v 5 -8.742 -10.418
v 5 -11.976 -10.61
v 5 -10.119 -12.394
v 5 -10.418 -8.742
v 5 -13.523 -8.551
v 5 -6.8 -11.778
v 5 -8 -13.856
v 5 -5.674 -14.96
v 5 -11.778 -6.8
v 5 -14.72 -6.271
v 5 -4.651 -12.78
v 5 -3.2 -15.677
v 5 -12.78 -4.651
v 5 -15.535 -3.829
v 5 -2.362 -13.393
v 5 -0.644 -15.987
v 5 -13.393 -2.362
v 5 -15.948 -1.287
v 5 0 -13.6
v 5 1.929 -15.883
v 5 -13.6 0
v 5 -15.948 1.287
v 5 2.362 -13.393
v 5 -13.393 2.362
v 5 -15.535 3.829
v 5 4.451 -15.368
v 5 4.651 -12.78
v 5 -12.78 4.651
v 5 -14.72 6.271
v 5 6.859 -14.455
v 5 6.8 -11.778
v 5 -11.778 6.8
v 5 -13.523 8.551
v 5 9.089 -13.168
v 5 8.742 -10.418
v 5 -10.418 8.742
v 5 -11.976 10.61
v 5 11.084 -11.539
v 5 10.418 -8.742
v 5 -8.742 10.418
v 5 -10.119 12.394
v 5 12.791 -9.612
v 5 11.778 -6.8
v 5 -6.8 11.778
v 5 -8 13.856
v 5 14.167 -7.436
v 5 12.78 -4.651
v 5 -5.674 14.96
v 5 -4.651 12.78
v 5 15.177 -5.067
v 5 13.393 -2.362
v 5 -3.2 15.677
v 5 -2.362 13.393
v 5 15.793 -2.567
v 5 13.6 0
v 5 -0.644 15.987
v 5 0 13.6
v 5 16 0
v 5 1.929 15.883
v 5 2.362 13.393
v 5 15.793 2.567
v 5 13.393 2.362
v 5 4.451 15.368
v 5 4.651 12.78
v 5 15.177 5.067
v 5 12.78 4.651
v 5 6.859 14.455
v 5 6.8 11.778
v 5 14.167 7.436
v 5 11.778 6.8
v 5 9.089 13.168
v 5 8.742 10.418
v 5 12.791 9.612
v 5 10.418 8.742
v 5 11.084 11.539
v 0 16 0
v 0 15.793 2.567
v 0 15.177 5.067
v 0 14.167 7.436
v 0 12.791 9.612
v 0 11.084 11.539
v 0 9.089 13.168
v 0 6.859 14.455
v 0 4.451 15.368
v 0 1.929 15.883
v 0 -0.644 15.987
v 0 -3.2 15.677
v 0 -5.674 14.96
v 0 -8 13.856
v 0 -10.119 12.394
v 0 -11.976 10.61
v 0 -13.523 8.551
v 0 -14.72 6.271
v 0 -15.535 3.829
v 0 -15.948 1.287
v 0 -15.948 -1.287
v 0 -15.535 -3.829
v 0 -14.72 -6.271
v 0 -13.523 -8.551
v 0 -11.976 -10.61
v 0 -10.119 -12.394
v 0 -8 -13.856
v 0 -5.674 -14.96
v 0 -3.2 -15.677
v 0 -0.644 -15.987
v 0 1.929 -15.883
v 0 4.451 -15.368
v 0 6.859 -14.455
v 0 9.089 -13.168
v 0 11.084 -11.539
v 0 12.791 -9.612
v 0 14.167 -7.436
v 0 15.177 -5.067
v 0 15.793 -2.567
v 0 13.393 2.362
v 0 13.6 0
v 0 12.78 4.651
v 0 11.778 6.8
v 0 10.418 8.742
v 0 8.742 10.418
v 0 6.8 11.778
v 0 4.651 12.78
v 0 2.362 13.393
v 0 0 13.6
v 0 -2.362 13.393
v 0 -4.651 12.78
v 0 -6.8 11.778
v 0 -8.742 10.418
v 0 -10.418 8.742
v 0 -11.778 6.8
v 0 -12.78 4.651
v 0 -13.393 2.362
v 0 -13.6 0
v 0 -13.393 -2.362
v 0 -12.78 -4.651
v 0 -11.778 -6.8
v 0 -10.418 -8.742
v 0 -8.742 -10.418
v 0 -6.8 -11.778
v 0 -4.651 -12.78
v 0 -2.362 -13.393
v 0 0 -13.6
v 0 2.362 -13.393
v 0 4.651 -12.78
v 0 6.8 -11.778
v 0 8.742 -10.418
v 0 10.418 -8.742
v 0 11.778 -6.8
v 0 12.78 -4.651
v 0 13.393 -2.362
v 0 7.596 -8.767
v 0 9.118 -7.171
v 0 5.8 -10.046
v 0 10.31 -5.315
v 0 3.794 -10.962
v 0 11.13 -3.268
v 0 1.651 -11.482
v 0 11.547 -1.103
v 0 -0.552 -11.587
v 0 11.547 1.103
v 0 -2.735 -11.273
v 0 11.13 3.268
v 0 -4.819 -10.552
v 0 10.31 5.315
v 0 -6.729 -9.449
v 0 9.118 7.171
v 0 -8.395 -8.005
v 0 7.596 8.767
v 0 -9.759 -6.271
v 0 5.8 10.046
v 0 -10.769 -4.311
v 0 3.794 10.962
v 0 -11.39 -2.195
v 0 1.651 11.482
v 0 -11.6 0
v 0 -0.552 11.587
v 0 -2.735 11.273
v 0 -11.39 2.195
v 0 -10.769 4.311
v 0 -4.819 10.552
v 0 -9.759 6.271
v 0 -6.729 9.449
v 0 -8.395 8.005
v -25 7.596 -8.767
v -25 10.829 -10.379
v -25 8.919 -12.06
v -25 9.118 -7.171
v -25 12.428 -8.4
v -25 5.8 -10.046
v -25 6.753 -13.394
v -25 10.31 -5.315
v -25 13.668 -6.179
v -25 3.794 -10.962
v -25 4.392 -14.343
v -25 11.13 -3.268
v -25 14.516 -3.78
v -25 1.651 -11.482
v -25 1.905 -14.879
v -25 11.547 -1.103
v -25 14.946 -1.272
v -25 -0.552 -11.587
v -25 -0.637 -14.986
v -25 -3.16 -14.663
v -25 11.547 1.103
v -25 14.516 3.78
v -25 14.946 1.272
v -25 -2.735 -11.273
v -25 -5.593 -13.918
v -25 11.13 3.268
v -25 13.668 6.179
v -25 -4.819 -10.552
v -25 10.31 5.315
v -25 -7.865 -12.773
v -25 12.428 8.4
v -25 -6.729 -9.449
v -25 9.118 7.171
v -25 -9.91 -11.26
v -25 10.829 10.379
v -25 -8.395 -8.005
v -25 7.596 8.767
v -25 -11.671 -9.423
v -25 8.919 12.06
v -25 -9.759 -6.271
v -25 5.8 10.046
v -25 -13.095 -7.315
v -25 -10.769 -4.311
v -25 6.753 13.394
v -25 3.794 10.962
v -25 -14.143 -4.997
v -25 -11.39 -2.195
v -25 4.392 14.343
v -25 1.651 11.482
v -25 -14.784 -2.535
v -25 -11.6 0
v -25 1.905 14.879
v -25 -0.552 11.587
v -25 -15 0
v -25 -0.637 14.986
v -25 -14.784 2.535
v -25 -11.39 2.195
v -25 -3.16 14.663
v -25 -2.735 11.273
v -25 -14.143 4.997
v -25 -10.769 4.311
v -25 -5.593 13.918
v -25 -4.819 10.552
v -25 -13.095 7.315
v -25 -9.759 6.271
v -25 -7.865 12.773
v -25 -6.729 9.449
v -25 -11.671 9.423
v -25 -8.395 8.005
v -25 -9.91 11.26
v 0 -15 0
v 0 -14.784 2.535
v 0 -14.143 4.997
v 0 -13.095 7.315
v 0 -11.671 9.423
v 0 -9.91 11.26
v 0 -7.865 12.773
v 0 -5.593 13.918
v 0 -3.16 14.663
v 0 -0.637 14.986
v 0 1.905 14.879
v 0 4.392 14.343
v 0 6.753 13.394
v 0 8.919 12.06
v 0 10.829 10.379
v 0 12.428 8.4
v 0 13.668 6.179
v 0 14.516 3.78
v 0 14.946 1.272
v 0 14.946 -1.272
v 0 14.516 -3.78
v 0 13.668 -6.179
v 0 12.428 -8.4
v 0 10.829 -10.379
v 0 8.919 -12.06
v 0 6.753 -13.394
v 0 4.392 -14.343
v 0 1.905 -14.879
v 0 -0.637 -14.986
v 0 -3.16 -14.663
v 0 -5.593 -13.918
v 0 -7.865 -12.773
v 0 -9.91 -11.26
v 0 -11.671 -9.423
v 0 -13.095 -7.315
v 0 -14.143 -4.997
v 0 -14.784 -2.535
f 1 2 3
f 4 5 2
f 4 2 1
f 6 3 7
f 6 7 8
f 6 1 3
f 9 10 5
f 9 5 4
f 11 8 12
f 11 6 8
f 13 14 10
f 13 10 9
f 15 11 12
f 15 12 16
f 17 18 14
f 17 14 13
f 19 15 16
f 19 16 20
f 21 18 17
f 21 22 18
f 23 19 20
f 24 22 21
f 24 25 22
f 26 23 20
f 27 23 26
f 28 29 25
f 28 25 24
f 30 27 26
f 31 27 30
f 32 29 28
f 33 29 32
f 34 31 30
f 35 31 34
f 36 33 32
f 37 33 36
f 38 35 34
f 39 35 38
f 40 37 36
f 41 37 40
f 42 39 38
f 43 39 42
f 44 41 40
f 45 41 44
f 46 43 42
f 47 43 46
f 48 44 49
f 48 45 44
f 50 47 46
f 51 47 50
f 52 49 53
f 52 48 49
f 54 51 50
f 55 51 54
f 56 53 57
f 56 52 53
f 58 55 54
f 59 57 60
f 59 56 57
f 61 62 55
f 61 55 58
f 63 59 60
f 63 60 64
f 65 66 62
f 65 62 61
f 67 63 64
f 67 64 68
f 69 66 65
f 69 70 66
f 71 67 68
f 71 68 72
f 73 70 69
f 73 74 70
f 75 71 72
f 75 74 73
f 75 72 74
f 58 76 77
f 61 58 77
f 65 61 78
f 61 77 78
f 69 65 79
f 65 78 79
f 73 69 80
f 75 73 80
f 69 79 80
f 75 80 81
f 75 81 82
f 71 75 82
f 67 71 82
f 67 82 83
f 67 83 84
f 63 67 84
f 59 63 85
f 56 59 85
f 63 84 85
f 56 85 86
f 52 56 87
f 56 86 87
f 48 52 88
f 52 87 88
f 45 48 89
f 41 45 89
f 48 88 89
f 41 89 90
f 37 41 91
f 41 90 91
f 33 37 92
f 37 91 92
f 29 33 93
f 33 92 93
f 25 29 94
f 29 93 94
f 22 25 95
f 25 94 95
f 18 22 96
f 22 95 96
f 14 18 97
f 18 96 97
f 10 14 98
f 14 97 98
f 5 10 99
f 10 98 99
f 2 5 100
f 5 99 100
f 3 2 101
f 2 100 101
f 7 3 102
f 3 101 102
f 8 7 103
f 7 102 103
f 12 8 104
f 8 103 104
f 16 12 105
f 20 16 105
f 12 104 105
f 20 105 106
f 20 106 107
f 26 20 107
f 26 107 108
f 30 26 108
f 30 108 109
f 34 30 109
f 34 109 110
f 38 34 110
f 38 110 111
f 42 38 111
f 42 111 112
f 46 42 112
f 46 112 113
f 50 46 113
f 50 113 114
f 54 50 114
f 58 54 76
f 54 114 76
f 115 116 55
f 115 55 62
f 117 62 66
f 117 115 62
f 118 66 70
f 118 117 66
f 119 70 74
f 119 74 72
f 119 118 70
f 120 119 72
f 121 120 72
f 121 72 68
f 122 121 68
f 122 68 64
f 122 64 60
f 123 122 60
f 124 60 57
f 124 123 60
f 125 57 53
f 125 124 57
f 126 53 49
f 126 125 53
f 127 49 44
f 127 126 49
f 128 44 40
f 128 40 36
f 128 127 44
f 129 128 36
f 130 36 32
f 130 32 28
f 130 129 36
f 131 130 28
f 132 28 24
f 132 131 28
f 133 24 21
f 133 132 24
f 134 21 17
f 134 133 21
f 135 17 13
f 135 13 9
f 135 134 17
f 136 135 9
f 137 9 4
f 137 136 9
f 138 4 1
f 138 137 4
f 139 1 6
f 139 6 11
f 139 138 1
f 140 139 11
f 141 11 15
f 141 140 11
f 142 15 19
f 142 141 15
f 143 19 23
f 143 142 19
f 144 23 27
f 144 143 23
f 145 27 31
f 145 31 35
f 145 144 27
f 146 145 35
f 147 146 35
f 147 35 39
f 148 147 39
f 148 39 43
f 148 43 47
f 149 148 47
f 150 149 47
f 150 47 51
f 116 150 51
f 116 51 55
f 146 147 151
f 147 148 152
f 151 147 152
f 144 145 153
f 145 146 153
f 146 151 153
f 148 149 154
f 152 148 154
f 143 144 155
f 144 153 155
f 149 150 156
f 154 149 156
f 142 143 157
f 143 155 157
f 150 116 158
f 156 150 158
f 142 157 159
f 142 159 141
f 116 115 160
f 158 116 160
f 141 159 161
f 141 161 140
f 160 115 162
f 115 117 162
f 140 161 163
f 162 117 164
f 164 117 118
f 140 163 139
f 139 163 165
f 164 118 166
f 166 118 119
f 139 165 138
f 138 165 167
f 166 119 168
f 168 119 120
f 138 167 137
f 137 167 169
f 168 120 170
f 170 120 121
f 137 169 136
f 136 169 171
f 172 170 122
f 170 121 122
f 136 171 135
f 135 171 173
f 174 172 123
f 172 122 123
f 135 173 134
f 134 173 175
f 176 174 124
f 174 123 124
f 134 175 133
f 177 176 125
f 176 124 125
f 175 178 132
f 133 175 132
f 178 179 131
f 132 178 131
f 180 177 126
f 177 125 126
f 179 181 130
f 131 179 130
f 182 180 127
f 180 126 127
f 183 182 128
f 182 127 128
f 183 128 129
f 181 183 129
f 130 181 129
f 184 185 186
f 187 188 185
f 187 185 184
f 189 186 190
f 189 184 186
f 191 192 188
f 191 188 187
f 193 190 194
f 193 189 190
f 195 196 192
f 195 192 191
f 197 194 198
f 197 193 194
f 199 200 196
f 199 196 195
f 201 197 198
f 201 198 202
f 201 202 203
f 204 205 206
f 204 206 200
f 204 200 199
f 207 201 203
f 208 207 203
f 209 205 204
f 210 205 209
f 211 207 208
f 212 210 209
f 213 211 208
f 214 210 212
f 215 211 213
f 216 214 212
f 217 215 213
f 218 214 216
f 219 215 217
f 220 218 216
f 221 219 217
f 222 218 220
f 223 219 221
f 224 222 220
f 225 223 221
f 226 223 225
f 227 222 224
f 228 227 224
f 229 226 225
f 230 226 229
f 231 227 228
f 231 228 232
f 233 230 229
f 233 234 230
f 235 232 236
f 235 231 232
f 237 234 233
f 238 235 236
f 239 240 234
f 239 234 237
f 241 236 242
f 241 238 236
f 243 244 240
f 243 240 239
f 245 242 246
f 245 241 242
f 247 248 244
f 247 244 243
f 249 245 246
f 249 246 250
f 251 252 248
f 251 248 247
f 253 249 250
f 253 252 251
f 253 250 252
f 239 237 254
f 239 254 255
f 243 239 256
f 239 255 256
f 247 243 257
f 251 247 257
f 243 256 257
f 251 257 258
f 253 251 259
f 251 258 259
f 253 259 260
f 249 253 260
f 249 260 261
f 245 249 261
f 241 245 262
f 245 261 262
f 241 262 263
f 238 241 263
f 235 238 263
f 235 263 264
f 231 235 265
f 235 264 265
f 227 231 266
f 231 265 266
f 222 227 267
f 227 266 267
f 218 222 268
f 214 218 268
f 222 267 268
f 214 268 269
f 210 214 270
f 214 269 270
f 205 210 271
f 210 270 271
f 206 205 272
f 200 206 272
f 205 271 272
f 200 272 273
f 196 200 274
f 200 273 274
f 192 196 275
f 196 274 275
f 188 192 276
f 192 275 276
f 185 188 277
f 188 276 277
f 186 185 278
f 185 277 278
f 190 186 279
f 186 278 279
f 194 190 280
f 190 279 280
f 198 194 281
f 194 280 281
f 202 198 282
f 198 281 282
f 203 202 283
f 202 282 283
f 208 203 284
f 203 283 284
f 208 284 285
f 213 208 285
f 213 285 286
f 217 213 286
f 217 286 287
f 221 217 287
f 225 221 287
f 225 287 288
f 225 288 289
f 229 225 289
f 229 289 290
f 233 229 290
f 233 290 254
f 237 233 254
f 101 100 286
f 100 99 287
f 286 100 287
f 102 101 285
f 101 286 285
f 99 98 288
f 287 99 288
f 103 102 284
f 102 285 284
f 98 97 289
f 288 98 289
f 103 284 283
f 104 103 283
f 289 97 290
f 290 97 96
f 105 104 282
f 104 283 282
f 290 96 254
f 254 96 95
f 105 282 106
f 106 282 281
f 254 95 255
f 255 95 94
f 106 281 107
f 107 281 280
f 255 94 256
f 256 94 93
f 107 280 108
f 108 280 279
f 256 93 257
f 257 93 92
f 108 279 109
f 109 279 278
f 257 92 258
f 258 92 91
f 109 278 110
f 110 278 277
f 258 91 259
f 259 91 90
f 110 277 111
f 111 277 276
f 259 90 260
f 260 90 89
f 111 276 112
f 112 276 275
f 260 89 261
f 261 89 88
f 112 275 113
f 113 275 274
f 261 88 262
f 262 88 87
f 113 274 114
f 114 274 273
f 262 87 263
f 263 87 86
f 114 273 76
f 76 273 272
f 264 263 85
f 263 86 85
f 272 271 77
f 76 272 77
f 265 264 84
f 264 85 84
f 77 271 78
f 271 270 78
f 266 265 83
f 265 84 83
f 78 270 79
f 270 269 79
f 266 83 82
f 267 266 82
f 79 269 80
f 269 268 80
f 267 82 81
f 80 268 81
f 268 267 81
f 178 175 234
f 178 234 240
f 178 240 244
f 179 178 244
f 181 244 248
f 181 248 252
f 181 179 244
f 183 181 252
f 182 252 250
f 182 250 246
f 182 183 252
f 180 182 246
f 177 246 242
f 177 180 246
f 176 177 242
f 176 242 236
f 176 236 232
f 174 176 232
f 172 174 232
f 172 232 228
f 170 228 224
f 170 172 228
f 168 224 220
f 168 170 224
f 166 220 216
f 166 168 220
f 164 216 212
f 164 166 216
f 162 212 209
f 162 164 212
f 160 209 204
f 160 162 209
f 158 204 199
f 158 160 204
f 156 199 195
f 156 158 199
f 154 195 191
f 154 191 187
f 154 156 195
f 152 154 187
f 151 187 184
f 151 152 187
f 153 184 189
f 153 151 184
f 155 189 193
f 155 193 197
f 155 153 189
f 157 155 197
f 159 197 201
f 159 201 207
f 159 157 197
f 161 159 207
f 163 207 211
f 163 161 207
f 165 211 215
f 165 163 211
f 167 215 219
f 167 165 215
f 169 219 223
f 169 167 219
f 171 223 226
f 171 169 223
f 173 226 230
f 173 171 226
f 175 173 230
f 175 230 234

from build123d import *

# Parameters (mm, degrees)
F0_R     = 16
F0_R_2   = 13.6
F1_DEPTH = 5
F2_R     = 15
F2_R_2   = 11.6
F3_DEPTH = 25


with BuildPart() as f1:
    # F0 (on Right) → F1 (new body)
    with BuildSketch(Plane.YZ):
        Circle(F0_R)
        Circle(F0_R_2, mode=Mode.SUBTRACT)
    extrude(amount=F1_DEPTH)

    # F2 (on face) → F3 (join)
    with BuildSketch(Plane(origin=(0, 0, 0), x_dir=(0, -1, 0), z_dir=(-1, 0, 0))):
        Circle(F2_R)
        Circle(F2_R_2, mode=Mode.SUBTRACT)
    extrude(amount=F3_DEPTH)


solid = f1.part
